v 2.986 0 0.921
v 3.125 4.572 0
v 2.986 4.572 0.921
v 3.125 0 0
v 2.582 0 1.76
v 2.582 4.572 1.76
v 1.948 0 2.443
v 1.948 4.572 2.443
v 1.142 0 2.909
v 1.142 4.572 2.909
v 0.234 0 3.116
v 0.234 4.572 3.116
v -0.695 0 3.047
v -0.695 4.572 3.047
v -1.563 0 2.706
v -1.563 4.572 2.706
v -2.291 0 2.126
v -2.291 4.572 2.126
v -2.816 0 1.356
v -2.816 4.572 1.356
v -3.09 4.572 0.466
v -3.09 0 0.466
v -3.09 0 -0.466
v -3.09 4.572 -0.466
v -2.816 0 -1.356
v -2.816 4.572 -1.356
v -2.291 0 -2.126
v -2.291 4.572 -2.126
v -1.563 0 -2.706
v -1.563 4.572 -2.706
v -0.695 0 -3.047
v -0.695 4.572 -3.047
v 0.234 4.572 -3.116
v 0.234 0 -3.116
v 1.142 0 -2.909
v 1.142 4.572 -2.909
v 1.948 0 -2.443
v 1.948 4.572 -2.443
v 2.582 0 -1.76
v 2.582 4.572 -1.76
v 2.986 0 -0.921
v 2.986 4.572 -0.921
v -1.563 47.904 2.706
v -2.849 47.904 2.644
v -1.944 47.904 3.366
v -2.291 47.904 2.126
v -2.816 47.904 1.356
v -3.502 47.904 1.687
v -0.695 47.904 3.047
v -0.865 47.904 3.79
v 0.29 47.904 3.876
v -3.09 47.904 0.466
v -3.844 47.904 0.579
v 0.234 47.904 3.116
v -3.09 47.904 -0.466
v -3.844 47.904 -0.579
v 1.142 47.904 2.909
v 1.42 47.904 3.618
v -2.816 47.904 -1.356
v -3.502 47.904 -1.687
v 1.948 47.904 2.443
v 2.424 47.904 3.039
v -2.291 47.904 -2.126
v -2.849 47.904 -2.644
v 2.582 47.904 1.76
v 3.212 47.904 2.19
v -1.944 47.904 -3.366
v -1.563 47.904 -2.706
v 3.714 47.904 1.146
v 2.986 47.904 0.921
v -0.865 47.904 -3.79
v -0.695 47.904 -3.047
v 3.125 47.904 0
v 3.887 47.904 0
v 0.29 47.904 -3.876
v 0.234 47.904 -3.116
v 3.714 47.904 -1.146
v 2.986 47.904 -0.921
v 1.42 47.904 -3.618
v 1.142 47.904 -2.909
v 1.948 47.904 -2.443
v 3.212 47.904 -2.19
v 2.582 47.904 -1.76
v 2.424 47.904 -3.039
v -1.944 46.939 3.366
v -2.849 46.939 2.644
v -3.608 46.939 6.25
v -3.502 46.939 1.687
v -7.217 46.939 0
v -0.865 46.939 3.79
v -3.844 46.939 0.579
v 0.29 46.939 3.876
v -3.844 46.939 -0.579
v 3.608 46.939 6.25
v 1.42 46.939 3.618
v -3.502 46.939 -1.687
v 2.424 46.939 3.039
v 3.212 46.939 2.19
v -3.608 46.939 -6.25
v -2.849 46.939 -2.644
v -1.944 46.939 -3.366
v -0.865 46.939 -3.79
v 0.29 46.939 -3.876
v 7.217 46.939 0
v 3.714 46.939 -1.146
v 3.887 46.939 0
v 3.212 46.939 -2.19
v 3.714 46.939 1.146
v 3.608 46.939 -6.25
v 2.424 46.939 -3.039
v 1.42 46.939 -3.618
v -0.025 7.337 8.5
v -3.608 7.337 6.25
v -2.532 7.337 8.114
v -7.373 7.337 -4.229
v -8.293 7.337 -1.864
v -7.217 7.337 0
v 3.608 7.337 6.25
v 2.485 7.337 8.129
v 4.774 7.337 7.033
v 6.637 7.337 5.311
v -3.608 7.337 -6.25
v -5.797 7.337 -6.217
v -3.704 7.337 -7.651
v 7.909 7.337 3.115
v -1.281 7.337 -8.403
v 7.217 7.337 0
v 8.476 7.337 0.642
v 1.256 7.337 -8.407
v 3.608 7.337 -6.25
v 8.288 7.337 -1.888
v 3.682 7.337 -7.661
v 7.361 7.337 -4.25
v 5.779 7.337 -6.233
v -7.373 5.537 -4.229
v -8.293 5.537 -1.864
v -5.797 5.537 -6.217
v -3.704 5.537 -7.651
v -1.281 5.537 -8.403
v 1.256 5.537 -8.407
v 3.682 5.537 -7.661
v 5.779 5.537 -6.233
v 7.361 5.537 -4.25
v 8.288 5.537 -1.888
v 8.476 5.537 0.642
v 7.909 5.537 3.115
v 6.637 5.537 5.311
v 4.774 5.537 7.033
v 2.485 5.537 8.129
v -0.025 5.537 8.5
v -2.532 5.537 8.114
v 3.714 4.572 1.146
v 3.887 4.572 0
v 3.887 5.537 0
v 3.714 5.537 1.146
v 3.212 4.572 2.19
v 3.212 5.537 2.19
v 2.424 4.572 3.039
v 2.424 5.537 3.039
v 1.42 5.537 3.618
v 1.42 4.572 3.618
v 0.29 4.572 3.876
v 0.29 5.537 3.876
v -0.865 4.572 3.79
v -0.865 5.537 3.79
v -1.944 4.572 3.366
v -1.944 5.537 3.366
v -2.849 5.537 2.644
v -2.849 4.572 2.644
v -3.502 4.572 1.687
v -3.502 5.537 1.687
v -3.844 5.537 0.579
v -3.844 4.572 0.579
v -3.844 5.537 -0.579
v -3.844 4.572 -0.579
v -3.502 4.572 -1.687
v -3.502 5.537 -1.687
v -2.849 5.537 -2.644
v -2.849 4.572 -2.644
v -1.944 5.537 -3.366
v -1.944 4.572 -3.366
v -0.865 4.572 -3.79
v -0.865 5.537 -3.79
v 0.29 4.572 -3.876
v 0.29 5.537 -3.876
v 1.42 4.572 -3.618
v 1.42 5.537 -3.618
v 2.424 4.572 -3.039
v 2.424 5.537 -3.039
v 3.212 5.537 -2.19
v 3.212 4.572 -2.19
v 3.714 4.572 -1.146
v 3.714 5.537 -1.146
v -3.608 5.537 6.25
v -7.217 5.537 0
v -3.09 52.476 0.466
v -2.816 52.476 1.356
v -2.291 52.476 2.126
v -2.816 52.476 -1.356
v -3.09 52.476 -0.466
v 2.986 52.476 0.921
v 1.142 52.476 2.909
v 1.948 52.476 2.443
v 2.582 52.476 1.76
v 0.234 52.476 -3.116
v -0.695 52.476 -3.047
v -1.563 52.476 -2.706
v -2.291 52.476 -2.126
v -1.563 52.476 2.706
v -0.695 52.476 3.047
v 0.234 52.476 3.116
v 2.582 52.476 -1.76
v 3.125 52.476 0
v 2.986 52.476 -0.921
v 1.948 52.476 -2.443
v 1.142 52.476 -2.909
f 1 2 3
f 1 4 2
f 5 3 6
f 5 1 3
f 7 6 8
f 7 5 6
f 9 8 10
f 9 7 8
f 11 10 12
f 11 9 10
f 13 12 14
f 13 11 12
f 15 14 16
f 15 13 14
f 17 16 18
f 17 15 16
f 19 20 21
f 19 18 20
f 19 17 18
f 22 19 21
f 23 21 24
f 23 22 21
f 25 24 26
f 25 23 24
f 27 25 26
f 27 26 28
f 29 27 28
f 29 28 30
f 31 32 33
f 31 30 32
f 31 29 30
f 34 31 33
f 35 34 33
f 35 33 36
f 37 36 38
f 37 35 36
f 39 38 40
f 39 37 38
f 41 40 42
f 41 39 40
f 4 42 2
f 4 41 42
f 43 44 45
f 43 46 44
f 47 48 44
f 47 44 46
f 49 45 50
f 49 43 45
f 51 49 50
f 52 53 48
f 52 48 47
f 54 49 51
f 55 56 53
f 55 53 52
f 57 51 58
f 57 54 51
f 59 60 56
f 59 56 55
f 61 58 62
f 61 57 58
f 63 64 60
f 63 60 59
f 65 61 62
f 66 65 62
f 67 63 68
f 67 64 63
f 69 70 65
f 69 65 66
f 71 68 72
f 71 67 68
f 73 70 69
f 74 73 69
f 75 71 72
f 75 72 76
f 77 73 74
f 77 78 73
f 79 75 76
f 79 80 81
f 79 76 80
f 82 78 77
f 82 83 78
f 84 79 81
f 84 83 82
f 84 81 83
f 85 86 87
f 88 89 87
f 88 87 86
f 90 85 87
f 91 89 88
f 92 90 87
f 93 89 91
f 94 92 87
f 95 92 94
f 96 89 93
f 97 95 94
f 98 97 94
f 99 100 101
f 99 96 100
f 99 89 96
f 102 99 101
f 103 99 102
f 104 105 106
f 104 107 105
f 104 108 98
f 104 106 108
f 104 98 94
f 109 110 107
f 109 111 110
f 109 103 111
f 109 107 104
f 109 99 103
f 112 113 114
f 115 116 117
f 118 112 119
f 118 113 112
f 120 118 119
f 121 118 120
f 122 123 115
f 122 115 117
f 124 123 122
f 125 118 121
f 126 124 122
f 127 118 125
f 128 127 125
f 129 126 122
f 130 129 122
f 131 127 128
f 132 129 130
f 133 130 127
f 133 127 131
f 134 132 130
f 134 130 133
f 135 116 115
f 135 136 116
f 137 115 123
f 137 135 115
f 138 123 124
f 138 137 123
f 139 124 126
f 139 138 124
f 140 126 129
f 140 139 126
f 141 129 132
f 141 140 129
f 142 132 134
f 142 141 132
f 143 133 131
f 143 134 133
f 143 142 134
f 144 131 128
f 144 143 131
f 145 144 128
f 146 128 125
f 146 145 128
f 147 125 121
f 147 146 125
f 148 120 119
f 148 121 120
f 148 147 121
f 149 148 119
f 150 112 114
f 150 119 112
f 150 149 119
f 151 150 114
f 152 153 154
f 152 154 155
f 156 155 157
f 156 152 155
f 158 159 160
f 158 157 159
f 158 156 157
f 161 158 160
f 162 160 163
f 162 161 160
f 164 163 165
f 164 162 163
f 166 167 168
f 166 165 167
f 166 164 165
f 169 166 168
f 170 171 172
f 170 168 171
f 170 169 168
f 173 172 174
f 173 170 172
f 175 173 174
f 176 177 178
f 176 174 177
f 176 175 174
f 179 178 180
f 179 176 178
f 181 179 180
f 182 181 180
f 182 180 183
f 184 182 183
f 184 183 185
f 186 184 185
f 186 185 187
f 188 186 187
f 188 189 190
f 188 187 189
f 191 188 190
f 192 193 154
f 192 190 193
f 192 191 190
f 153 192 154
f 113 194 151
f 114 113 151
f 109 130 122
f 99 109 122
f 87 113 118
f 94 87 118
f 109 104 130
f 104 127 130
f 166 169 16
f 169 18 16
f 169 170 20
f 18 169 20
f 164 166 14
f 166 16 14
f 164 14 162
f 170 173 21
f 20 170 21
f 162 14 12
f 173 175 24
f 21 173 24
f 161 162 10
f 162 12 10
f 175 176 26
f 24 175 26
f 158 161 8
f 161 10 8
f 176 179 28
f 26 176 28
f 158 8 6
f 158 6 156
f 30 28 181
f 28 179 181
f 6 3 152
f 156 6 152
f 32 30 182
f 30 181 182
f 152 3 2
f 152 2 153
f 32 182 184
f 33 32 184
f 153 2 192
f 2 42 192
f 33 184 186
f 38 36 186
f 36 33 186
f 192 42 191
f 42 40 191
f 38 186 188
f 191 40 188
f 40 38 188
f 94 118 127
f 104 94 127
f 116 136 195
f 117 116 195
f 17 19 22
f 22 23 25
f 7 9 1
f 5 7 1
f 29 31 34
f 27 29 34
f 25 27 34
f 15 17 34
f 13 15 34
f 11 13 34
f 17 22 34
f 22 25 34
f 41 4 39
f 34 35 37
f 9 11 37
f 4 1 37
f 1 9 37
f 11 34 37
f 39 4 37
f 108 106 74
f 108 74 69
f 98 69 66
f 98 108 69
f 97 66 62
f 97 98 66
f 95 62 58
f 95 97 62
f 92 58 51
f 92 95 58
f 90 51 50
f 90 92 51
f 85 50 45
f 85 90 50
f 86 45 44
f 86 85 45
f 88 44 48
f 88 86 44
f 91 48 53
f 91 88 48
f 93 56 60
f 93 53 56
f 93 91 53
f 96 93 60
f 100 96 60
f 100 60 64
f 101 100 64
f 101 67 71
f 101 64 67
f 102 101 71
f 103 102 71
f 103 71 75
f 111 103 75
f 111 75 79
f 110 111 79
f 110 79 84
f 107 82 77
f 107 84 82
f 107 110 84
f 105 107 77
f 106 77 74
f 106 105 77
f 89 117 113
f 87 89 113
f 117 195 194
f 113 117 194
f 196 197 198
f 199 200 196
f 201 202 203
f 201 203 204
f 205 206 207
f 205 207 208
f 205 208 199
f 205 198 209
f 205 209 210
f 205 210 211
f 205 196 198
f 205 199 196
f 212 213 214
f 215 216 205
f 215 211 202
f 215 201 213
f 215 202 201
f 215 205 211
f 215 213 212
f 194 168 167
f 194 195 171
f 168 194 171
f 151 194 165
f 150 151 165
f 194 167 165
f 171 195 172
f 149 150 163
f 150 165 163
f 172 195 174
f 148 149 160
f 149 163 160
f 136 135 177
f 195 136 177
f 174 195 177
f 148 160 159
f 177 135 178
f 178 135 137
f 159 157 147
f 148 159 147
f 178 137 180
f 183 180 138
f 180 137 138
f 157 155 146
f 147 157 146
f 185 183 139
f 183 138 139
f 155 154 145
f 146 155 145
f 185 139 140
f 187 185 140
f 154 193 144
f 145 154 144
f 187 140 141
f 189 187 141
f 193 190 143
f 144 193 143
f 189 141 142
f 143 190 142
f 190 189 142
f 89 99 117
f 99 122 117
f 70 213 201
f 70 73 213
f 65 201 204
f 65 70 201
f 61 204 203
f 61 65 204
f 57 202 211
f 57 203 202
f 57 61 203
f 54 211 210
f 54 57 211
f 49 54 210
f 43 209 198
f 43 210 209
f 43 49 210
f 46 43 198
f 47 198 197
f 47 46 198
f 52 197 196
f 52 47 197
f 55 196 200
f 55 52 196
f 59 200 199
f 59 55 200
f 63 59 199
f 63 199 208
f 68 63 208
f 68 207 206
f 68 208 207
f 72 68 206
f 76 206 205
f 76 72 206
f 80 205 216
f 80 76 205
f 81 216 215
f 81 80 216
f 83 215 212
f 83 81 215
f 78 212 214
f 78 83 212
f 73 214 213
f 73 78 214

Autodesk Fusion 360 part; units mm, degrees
sketch "Sketch1" plane through (0, 0, 0) normal (0, 1, 0) x (1, 0, 0)
  circle A0 centre (0, 0) radius 3.125
  circle A1 centre (0, 0) radius 3.887
  line L0 (7.2169, 0) -> (3.6084, 6.25)
  line L1 (3.6084, 6.25) -> (-3.6084, 6.25)
  line L2 (-3.6084, 6.25) -> (-7.2169, 0)
  line L3 (-7.2169, 0) -> (-3.6084, -6.25)
  line L4 (-3.6084, -6.25) -> (3.6084, -6.25)
  line L5 (3.6084, -6.25) -> (7.2169, 0)
  line L6 (-8.2931, 1.8641) -> (-2.5322, -8.1141)
  arc A2 (-2.5322, -8.1141) -> (-8.2931, 1.8641) centre (0, 0) ccw
  dimension "d1" = 6.25
  dimension "d2" = 0.762
  dimension "d3" = 6.25
  dimension "d22" = 8.5
extrude "Extrude1" add sketch "Sketch1" along normal blind 4.572 contours A0
extrude "Extrude2" add sketch "Sketch1" along normal blind 0.9652 from surface at 4.572 contours A0 | A1
extrude "Extrude3" add sketch "Sketch1" along normal blind 41.402 from surface at 5.5372 contours A0 | A1 | L0 L1 L2 L3 L4 L5 L6
extrude "Extrude4" add sketch "Sketch1" along normal blind 0.9652 from surface at 46.9392 contours A0 | A1
extrude "Extrude5" add sketch "Sketch1" along normal blind 4.572 from surface at 47.9044 contours A0
extrude "Extrude6" add sketch "Sketch1" along normal blind 1.8 from surface at 5.5372 contours L0 L1 L2 L4 L5 L6 A2
equation "d1 = ( ( 1 / 4 ) * 1 ) * 1 in - 0.1 mm"
equation "d3 = 0.25 in - 0.1 mm"
